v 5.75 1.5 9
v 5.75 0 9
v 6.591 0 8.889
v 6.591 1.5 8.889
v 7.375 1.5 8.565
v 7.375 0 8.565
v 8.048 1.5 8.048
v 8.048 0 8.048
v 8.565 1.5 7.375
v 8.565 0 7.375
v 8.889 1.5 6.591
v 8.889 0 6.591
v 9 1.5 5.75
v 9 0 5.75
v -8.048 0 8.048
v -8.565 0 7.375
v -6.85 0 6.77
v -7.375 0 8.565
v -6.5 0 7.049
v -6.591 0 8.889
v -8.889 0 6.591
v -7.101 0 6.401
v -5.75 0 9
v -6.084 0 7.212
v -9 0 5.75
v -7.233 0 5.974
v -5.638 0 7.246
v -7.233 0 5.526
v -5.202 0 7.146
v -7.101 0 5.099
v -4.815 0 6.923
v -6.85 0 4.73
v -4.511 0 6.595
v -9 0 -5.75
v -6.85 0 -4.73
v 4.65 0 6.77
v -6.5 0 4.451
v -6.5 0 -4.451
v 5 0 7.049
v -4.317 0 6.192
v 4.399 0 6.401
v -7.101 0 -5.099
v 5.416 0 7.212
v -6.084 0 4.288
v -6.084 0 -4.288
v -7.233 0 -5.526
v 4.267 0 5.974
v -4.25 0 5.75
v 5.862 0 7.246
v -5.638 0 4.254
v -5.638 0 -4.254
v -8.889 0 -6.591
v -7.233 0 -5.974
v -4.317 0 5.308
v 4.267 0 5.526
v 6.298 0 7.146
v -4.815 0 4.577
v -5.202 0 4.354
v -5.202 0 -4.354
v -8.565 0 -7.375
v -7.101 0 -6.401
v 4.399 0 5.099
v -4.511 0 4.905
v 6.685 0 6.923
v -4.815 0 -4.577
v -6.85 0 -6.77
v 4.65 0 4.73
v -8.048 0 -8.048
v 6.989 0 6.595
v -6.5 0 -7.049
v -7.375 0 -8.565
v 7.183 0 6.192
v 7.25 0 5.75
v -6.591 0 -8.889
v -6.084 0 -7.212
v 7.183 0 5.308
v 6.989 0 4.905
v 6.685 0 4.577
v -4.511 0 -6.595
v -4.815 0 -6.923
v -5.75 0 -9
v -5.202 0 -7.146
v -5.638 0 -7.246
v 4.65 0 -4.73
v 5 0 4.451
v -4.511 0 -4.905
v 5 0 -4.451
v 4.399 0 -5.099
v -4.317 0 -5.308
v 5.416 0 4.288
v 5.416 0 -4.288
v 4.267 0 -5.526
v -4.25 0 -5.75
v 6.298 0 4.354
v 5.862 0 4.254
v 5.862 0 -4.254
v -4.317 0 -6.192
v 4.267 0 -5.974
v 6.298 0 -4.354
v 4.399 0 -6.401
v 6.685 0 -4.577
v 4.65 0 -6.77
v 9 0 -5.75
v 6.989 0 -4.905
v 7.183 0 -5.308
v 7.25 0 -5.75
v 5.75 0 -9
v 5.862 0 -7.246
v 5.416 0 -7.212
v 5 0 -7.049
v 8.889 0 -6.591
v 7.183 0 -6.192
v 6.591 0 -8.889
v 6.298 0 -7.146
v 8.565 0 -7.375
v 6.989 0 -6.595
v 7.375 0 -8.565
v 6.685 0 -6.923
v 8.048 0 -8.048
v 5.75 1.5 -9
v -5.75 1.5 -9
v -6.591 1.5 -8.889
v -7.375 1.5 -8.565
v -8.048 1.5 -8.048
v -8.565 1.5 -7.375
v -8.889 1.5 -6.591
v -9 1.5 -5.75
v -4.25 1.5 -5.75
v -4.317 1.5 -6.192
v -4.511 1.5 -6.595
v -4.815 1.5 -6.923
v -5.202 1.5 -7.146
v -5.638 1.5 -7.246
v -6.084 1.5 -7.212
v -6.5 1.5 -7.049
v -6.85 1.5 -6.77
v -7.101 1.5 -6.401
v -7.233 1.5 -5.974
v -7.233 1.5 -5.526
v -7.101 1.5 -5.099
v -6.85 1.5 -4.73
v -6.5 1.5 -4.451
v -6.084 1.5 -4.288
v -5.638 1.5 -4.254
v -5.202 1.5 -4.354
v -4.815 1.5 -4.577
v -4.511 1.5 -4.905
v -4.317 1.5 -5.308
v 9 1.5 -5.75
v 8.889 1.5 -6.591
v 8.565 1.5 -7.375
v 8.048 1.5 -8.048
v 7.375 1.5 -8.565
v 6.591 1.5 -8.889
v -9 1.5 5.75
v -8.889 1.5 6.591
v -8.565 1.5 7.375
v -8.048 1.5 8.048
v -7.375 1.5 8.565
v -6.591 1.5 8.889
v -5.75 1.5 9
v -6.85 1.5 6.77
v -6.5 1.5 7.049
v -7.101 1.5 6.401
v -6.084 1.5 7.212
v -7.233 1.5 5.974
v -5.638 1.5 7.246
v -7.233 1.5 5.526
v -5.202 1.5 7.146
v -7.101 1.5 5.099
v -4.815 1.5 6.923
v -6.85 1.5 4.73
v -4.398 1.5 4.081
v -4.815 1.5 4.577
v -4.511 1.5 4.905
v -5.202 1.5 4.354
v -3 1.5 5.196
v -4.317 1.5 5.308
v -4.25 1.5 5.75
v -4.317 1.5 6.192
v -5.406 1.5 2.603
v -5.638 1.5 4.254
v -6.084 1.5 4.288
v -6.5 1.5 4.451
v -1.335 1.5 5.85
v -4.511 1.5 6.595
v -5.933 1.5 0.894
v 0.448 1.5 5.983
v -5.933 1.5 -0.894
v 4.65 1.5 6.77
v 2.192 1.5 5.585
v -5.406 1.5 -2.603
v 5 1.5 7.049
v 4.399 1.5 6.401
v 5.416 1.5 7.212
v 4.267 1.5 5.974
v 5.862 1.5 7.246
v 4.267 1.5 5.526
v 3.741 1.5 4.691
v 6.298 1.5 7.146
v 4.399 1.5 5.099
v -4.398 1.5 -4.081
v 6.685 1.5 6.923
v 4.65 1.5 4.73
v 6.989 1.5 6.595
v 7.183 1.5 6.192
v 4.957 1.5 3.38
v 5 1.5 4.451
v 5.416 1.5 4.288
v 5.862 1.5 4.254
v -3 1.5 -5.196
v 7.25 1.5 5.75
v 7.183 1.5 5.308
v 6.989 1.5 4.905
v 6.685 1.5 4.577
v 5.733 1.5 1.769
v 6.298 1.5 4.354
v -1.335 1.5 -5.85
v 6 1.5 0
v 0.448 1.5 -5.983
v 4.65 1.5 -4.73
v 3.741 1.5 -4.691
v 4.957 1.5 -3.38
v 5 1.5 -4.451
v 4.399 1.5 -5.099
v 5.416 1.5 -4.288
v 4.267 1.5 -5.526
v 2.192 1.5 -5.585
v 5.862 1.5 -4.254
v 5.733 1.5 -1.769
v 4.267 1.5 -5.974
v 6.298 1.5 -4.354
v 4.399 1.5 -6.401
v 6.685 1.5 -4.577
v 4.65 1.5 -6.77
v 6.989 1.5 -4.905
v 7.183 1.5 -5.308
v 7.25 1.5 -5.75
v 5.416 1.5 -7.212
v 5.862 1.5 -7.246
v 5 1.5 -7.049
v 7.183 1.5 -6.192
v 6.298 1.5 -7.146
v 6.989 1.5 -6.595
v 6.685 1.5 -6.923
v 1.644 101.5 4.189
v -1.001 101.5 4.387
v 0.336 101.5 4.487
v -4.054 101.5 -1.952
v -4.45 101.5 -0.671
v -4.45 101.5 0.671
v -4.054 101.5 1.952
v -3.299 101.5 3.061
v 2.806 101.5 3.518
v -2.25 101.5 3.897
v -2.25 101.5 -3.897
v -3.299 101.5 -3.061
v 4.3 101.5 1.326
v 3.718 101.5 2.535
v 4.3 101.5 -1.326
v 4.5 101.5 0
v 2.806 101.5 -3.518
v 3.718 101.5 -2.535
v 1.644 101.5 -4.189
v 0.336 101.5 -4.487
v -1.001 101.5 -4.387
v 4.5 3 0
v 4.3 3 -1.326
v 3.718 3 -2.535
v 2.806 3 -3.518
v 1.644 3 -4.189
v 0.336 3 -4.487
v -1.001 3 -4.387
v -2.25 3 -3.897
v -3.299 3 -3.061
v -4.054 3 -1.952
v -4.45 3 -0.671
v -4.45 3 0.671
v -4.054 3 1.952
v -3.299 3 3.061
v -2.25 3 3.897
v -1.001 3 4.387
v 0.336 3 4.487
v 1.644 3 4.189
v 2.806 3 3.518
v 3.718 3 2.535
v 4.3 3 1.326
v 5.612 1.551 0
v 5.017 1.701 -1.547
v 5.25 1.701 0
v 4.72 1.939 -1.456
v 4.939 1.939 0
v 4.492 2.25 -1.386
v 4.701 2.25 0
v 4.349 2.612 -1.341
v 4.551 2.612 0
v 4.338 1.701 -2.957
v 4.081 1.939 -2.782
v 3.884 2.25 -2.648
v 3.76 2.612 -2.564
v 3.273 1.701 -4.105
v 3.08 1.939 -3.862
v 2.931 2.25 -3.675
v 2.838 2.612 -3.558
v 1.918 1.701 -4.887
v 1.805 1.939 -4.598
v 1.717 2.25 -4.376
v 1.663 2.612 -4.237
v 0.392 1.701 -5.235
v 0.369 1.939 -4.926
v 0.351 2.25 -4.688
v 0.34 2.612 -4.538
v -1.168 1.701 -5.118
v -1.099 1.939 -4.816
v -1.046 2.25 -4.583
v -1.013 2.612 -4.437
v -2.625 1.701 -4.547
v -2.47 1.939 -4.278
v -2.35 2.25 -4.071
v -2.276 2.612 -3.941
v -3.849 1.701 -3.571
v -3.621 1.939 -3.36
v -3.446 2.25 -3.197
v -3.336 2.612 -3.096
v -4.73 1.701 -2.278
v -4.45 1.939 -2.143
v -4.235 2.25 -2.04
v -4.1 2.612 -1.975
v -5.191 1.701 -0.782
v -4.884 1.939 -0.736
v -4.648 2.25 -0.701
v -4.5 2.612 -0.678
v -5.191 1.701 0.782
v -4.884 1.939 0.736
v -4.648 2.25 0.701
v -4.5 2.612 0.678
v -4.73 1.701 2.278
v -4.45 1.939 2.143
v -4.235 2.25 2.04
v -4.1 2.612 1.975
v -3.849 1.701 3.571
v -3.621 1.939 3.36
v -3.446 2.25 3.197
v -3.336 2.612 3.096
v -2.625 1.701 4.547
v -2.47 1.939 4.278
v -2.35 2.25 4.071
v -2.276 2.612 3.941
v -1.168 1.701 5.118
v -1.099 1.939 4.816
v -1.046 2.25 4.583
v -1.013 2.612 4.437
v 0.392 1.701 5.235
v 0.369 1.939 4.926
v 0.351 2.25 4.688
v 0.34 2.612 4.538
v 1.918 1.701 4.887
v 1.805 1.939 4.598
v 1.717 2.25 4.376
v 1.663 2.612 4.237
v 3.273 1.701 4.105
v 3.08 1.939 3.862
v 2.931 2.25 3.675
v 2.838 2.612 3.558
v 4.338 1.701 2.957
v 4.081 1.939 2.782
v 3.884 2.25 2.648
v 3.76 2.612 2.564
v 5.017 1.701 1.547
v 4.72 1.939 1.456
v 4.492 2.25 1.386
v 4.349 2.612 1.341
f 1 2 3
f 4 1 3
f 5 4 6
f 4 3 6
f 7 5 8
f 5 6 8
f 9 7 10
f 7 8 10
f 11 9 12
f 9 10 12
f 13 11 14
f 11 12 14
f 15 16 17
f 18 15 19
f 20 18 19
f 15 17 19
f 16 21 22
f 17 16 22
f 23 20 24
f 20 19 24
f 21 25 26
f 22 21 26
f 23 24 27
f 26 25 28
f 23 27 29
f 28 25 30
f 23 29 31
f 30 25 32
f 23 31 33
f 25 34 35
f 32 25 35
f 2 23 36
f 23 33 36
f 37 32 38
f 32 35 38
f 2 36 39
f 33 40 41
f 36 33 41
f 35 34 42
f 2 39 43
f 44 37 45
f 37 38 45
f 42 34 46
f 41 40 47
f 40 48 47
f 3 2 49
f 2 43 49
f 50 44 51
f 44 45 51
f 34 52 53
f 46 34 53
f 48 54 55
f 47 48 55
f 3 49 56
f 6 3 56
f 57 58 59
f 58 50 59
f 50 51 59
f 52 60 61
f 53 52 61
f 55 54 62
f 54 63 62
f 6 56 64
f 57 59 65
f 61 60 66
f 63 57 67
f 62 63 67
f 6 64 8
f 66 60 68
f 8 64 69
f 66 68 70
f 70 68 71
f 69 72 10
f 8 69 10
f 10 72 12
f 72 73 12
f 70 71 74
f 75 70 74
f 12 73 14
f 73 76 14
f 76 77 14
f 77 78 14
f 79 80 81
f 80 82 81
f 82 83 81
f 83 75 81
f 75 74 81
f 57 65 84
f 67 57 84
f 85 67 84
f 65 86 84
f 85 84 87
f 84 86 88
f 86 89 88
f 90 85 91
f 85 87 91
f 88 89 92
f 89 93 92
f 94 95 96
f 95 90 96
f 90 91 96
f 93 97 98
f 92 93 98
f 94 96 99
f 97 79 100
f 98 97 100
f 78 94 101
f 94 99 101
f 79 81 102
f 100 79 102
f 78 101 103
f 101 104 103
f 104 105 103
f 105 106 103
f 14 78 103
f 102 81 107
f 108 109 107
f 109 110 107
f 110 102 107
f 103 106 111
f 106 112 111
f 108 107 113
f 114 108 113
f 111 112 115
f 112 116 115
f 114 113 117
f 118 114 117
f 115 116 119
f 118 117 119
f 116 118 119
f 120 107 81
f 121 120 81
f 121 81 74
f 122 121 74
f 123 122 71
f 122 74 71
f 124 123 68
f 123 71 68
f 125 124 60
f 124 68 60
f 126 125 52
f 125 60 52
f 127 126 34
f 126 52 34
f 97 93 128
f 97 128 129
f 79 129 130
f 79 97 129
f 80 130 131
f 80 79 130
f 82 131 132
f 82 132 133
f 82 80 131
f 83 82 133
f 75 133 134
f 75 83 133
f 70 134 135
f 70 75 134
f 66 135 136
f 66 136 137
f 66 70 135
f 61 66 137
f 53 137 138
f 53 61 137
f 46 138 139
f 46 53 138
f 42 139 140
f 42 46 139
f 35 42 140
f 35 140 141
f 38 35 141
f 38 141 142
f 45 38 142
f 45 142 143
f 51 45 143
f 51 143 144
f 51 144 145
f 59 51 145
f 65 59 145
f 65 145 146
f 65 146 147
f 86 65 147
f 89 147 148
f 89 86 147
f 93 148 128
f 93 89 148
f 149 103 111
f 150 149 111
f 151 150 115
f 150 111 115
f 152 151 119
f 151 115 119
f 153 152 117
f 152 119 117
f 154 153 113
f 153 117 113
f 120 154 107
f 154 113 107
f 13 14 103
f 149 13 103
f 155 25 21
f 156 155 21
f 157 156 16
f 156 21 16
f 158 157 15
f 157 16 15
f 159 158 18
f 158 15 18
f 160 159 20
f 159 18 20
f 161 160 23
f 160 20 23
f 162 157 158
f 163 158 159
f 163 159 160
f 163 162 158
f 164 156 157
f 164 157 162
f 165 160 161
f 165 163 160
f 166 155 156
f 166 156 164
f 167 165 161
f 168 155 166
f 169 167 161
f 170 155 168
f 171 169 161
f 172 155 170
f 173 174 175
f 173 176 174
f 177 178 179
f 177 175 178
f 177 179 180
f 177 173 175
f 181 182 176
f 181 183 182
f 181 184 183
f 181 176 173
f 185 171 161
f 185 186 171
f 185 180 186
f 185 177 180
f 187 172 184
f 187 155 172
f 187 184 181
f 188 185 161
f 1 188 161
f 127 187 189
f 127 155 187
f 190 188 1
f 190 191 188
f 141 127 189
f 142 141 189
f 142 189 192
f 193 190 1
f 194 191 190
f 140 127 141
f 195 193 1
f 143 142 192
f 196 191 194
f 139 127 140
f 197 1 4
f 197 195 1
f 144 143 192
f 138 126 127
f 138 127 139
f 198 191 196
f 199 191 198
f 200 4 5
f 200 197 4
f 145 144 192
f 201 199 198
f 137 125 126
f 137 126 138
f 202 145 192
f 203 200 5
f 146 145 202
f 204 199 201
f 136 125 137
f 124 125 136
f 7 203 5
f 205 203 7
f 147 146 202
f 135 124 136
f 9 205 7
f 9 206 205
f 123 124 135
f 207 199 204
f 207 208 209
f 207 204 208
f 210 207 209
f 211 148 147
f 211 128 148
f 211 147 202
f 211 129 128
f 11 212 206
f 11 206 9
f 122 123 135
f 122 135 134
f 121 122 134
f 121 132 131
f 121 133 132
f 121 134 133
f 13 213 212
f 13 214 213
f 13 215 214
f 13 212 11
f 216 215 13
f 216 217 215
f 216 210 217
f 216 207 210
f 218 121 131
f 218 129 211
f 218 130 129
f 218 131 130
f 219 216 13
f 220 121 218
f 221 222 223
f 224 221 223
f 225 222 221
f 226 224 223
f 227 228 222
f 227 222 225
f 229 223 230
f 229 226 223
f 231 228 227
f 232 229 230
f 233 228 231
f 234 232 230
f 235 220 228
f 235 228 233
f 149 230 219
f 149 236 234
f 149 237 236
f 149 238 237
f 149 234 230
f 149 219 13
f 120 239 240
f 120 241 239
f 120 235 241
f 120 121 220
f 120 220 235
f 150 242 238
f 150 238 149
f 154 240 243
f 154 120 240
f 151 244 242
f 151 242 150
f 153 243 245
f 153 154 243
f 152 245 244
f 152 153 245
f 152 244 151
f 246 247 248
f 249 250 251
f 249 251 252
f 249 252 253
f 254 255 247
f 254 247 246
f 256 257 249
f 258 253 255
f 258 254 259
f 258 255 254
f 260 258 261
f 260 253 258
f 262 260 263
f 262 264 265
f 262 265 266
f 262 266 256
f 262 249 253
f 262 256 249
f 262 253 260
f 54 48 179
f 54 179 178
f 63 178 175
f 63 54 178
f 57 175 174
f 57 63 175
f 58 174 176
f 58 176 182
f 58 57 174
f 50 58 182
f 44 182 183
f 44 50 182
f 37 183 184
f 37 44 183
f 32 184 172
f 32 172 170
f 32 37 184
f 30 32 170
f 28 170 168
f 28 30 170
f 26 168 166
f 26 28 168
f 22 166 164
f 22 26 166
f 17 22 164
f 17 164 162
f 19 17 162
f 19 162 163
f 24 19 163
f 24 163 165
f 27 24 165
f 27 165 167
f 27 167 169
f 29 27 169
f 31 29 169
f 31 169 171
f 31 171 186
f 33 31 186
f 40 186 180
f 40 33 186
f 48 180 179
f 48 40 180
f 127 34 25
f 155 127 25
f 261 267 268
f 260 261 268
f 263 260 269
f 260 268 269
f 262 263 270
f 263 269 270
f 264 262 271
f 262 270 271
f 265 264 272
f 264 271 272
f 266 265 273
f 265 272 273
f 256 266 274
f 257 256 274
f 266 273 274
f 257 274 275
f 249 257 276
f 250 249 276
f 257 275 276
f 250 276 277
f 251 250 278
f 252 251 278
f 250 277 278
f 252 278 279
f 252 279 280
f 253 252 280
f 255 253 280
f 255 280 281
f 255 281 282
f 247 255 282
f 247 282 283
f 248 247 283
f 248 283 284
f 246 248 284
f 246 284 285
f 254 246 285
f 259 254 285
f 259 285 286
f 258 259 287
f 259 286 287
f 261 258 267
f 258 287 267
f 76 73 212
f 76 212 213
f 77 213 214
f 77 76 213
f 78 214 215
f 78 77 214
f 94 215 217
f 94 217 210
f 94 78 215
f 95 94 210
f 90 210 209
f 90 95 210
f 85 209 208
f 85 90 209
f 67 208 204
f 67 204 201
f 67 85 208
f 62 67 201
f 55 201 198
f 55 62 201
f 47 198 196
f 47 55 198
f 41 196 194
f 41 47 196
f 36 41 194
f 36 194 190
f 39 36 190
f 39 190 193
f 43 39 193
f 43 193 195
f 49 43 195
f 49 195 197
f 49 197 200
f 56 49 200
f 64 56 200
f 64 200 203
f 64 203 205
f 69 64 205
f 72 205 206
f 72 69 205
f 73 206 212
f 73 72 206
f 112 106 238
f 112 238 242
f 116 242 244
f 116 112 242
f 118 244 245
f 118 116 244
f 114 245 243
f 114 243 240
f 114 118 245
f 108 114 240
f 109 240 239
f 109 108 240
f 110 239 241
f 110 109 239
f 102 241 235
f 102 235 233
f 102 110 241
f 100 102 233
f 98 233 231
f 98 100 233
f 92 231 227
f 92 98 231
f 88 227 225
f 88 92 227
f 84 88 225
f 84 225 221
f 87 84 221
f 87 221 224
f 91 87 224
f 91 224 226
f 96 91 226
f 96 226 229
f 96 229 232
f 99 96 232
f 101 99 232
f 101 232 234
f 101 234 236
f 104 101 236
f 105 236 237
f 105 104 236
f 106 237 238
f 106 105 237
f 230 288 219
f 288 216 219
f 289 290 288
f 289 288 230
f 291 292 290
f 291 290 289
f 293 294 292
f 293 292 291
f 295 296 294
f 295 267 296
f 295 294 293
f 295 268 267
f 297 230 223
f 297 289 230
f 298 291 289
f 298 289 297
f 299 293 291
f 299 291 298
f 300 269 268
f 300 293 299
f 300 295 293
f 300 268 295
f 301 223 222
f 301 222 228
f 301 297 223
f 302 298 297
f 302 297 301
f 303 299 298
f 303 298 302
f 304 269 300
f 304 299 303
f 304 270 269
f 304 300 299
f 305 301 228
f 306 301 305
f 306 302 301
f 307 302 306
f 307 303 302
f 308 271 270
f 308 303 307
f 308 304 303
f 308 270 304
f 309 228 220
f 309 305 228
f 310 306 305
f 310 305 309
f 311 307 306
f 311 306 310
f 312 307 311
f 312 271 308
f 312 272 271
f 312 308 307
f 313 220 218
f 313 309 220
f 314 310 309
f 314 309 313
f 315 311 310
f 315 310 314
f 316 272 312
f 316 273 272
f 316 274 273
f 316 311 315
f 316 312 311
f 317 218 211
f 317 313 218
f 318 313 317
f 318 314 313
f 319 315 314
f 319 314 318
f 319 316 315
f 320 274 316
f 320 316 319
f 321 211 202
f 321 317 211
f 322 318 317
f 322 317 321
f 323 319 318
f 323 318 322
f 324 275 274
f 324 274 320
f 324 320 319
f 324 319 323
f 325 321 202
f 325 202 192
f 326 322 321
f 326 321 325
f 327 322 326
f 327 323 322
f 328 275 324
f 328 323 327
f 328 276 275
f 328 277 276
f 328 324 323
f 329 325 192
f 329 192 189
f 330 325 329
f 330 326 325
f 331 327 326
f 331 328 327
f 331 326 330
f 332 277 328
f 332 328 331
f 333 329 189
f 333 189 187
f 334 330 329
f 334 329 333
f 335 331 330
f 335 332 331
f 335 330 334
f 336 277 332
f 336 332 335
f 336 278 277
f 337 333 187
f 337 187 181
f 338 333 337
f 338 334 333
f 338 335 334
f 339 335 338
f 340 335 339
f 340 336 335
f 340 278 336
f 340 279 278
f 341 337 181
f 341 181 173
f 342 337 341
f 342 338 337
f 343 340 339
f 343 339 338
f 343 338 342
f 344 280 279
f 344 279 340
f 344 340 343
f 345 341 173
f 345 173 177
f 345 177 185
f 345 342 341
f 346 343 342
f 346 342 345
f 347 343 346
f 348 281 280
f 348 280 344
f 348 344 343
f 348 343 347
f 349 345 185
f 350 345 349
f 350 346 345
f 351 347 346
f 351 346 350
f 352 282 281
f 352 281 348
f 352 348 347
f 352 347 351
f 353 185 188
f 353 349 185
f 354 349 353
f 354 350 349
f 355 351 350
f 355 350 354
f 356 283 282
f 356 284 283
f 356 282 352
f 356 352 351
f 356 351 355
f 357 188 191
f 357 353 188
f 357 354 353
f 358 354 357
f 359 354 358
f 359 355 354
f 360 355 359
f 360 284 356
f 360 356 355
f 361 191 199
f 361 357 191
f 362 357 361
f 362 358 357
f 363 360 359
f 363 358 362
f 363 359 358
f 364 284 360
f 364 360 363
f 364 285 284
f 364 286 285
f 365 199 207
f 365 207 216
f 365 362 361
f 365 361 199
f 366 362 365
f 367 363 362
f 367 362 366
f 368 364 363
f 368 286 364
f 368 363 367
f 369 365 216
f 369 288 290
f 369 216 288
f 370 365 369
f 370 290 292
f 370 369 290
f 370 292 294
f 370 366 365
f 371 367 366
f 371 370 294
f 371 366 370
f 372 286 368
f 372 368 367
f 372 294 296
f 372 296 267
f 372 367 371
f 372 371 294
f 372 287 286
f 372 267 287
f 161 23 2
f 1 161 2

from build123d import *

# Parameters (mm, degrees)
SKETCH1_R           = 1.5
BOSS_EXTRUDE1_DEPTH = 1.5
SKETCH2_R           = 4.5
BOSS_EXTRUDE2_DEPTH = 100
FILLET2_R           = 1.5


with BuildPart() as part:
    # Sketch1 → Boss-Extrude1 (new body)
    with BuildSketch(Plane(origin=(0, 0, 0), x_dir=(1, 0, 0), z_dir=(0, 1, 0))):
        with BuildLine():
            Line((5.75, 9), (-5.75, 9))
            ThreePointArc((-5.75, 9), (-8.048097039, 8.048097039), (-9, 5.75))
            Line((-9, 5.75), (-9, -5.75))
            ThreePointArc((-9, -5.75), (-8.048097039, -8.048097039), (-5.75, -9))
            Line((-5.75, -9), (5.75, -9))
            ThreePointArc((5.75, -9), (8.048097039, -8.048097039), (9, -5.75))
            Line((9, -5.75), (9, 5.75))
            ThreePointArc((9, 5.75), (8.048097039, 8.048097039), (5.75, 9))
        make_face()
        with Locations((5.75, 5.75)):
            Circle(SKETCH1_R, mode=Mode.SUBTRACT)
        with Locations((5.75, -5.75)):
            Circle(SKETCH1_R, mode=Mode.SUBTRACT)
        with Locations((-5.75, -5.75)):
            Circle(SKETCH1_R, mode=Mode.SUBTRACT)
        with Locations((-5.75, 5.75)):
            Circle(SKETCH1_R, mode=Mode.SUBTRACT)
    extrude(amount=BOSS_EXTRUDE1_DEPTH)

    # Sketch2 → Boss-Extrude2 (add)
    with BuildSketch(Plane(origin=(0, 1.5, 0), x_dir=(1, 0, 0), z_dir=(0, 1, 0))):
        Circle(SKETCH2_R)
    extrude(amount=BOSS_EXTRUDE2_DEPTH)

    # Fillet2
    fillet2_edges = [part.edges().sort_by_distance(p)[0] for p in [
        (-4.5, 1.5, 0),
    ]]
    fillet(fillet2_edges, radius=FILLET2_R)


solid = part.part
